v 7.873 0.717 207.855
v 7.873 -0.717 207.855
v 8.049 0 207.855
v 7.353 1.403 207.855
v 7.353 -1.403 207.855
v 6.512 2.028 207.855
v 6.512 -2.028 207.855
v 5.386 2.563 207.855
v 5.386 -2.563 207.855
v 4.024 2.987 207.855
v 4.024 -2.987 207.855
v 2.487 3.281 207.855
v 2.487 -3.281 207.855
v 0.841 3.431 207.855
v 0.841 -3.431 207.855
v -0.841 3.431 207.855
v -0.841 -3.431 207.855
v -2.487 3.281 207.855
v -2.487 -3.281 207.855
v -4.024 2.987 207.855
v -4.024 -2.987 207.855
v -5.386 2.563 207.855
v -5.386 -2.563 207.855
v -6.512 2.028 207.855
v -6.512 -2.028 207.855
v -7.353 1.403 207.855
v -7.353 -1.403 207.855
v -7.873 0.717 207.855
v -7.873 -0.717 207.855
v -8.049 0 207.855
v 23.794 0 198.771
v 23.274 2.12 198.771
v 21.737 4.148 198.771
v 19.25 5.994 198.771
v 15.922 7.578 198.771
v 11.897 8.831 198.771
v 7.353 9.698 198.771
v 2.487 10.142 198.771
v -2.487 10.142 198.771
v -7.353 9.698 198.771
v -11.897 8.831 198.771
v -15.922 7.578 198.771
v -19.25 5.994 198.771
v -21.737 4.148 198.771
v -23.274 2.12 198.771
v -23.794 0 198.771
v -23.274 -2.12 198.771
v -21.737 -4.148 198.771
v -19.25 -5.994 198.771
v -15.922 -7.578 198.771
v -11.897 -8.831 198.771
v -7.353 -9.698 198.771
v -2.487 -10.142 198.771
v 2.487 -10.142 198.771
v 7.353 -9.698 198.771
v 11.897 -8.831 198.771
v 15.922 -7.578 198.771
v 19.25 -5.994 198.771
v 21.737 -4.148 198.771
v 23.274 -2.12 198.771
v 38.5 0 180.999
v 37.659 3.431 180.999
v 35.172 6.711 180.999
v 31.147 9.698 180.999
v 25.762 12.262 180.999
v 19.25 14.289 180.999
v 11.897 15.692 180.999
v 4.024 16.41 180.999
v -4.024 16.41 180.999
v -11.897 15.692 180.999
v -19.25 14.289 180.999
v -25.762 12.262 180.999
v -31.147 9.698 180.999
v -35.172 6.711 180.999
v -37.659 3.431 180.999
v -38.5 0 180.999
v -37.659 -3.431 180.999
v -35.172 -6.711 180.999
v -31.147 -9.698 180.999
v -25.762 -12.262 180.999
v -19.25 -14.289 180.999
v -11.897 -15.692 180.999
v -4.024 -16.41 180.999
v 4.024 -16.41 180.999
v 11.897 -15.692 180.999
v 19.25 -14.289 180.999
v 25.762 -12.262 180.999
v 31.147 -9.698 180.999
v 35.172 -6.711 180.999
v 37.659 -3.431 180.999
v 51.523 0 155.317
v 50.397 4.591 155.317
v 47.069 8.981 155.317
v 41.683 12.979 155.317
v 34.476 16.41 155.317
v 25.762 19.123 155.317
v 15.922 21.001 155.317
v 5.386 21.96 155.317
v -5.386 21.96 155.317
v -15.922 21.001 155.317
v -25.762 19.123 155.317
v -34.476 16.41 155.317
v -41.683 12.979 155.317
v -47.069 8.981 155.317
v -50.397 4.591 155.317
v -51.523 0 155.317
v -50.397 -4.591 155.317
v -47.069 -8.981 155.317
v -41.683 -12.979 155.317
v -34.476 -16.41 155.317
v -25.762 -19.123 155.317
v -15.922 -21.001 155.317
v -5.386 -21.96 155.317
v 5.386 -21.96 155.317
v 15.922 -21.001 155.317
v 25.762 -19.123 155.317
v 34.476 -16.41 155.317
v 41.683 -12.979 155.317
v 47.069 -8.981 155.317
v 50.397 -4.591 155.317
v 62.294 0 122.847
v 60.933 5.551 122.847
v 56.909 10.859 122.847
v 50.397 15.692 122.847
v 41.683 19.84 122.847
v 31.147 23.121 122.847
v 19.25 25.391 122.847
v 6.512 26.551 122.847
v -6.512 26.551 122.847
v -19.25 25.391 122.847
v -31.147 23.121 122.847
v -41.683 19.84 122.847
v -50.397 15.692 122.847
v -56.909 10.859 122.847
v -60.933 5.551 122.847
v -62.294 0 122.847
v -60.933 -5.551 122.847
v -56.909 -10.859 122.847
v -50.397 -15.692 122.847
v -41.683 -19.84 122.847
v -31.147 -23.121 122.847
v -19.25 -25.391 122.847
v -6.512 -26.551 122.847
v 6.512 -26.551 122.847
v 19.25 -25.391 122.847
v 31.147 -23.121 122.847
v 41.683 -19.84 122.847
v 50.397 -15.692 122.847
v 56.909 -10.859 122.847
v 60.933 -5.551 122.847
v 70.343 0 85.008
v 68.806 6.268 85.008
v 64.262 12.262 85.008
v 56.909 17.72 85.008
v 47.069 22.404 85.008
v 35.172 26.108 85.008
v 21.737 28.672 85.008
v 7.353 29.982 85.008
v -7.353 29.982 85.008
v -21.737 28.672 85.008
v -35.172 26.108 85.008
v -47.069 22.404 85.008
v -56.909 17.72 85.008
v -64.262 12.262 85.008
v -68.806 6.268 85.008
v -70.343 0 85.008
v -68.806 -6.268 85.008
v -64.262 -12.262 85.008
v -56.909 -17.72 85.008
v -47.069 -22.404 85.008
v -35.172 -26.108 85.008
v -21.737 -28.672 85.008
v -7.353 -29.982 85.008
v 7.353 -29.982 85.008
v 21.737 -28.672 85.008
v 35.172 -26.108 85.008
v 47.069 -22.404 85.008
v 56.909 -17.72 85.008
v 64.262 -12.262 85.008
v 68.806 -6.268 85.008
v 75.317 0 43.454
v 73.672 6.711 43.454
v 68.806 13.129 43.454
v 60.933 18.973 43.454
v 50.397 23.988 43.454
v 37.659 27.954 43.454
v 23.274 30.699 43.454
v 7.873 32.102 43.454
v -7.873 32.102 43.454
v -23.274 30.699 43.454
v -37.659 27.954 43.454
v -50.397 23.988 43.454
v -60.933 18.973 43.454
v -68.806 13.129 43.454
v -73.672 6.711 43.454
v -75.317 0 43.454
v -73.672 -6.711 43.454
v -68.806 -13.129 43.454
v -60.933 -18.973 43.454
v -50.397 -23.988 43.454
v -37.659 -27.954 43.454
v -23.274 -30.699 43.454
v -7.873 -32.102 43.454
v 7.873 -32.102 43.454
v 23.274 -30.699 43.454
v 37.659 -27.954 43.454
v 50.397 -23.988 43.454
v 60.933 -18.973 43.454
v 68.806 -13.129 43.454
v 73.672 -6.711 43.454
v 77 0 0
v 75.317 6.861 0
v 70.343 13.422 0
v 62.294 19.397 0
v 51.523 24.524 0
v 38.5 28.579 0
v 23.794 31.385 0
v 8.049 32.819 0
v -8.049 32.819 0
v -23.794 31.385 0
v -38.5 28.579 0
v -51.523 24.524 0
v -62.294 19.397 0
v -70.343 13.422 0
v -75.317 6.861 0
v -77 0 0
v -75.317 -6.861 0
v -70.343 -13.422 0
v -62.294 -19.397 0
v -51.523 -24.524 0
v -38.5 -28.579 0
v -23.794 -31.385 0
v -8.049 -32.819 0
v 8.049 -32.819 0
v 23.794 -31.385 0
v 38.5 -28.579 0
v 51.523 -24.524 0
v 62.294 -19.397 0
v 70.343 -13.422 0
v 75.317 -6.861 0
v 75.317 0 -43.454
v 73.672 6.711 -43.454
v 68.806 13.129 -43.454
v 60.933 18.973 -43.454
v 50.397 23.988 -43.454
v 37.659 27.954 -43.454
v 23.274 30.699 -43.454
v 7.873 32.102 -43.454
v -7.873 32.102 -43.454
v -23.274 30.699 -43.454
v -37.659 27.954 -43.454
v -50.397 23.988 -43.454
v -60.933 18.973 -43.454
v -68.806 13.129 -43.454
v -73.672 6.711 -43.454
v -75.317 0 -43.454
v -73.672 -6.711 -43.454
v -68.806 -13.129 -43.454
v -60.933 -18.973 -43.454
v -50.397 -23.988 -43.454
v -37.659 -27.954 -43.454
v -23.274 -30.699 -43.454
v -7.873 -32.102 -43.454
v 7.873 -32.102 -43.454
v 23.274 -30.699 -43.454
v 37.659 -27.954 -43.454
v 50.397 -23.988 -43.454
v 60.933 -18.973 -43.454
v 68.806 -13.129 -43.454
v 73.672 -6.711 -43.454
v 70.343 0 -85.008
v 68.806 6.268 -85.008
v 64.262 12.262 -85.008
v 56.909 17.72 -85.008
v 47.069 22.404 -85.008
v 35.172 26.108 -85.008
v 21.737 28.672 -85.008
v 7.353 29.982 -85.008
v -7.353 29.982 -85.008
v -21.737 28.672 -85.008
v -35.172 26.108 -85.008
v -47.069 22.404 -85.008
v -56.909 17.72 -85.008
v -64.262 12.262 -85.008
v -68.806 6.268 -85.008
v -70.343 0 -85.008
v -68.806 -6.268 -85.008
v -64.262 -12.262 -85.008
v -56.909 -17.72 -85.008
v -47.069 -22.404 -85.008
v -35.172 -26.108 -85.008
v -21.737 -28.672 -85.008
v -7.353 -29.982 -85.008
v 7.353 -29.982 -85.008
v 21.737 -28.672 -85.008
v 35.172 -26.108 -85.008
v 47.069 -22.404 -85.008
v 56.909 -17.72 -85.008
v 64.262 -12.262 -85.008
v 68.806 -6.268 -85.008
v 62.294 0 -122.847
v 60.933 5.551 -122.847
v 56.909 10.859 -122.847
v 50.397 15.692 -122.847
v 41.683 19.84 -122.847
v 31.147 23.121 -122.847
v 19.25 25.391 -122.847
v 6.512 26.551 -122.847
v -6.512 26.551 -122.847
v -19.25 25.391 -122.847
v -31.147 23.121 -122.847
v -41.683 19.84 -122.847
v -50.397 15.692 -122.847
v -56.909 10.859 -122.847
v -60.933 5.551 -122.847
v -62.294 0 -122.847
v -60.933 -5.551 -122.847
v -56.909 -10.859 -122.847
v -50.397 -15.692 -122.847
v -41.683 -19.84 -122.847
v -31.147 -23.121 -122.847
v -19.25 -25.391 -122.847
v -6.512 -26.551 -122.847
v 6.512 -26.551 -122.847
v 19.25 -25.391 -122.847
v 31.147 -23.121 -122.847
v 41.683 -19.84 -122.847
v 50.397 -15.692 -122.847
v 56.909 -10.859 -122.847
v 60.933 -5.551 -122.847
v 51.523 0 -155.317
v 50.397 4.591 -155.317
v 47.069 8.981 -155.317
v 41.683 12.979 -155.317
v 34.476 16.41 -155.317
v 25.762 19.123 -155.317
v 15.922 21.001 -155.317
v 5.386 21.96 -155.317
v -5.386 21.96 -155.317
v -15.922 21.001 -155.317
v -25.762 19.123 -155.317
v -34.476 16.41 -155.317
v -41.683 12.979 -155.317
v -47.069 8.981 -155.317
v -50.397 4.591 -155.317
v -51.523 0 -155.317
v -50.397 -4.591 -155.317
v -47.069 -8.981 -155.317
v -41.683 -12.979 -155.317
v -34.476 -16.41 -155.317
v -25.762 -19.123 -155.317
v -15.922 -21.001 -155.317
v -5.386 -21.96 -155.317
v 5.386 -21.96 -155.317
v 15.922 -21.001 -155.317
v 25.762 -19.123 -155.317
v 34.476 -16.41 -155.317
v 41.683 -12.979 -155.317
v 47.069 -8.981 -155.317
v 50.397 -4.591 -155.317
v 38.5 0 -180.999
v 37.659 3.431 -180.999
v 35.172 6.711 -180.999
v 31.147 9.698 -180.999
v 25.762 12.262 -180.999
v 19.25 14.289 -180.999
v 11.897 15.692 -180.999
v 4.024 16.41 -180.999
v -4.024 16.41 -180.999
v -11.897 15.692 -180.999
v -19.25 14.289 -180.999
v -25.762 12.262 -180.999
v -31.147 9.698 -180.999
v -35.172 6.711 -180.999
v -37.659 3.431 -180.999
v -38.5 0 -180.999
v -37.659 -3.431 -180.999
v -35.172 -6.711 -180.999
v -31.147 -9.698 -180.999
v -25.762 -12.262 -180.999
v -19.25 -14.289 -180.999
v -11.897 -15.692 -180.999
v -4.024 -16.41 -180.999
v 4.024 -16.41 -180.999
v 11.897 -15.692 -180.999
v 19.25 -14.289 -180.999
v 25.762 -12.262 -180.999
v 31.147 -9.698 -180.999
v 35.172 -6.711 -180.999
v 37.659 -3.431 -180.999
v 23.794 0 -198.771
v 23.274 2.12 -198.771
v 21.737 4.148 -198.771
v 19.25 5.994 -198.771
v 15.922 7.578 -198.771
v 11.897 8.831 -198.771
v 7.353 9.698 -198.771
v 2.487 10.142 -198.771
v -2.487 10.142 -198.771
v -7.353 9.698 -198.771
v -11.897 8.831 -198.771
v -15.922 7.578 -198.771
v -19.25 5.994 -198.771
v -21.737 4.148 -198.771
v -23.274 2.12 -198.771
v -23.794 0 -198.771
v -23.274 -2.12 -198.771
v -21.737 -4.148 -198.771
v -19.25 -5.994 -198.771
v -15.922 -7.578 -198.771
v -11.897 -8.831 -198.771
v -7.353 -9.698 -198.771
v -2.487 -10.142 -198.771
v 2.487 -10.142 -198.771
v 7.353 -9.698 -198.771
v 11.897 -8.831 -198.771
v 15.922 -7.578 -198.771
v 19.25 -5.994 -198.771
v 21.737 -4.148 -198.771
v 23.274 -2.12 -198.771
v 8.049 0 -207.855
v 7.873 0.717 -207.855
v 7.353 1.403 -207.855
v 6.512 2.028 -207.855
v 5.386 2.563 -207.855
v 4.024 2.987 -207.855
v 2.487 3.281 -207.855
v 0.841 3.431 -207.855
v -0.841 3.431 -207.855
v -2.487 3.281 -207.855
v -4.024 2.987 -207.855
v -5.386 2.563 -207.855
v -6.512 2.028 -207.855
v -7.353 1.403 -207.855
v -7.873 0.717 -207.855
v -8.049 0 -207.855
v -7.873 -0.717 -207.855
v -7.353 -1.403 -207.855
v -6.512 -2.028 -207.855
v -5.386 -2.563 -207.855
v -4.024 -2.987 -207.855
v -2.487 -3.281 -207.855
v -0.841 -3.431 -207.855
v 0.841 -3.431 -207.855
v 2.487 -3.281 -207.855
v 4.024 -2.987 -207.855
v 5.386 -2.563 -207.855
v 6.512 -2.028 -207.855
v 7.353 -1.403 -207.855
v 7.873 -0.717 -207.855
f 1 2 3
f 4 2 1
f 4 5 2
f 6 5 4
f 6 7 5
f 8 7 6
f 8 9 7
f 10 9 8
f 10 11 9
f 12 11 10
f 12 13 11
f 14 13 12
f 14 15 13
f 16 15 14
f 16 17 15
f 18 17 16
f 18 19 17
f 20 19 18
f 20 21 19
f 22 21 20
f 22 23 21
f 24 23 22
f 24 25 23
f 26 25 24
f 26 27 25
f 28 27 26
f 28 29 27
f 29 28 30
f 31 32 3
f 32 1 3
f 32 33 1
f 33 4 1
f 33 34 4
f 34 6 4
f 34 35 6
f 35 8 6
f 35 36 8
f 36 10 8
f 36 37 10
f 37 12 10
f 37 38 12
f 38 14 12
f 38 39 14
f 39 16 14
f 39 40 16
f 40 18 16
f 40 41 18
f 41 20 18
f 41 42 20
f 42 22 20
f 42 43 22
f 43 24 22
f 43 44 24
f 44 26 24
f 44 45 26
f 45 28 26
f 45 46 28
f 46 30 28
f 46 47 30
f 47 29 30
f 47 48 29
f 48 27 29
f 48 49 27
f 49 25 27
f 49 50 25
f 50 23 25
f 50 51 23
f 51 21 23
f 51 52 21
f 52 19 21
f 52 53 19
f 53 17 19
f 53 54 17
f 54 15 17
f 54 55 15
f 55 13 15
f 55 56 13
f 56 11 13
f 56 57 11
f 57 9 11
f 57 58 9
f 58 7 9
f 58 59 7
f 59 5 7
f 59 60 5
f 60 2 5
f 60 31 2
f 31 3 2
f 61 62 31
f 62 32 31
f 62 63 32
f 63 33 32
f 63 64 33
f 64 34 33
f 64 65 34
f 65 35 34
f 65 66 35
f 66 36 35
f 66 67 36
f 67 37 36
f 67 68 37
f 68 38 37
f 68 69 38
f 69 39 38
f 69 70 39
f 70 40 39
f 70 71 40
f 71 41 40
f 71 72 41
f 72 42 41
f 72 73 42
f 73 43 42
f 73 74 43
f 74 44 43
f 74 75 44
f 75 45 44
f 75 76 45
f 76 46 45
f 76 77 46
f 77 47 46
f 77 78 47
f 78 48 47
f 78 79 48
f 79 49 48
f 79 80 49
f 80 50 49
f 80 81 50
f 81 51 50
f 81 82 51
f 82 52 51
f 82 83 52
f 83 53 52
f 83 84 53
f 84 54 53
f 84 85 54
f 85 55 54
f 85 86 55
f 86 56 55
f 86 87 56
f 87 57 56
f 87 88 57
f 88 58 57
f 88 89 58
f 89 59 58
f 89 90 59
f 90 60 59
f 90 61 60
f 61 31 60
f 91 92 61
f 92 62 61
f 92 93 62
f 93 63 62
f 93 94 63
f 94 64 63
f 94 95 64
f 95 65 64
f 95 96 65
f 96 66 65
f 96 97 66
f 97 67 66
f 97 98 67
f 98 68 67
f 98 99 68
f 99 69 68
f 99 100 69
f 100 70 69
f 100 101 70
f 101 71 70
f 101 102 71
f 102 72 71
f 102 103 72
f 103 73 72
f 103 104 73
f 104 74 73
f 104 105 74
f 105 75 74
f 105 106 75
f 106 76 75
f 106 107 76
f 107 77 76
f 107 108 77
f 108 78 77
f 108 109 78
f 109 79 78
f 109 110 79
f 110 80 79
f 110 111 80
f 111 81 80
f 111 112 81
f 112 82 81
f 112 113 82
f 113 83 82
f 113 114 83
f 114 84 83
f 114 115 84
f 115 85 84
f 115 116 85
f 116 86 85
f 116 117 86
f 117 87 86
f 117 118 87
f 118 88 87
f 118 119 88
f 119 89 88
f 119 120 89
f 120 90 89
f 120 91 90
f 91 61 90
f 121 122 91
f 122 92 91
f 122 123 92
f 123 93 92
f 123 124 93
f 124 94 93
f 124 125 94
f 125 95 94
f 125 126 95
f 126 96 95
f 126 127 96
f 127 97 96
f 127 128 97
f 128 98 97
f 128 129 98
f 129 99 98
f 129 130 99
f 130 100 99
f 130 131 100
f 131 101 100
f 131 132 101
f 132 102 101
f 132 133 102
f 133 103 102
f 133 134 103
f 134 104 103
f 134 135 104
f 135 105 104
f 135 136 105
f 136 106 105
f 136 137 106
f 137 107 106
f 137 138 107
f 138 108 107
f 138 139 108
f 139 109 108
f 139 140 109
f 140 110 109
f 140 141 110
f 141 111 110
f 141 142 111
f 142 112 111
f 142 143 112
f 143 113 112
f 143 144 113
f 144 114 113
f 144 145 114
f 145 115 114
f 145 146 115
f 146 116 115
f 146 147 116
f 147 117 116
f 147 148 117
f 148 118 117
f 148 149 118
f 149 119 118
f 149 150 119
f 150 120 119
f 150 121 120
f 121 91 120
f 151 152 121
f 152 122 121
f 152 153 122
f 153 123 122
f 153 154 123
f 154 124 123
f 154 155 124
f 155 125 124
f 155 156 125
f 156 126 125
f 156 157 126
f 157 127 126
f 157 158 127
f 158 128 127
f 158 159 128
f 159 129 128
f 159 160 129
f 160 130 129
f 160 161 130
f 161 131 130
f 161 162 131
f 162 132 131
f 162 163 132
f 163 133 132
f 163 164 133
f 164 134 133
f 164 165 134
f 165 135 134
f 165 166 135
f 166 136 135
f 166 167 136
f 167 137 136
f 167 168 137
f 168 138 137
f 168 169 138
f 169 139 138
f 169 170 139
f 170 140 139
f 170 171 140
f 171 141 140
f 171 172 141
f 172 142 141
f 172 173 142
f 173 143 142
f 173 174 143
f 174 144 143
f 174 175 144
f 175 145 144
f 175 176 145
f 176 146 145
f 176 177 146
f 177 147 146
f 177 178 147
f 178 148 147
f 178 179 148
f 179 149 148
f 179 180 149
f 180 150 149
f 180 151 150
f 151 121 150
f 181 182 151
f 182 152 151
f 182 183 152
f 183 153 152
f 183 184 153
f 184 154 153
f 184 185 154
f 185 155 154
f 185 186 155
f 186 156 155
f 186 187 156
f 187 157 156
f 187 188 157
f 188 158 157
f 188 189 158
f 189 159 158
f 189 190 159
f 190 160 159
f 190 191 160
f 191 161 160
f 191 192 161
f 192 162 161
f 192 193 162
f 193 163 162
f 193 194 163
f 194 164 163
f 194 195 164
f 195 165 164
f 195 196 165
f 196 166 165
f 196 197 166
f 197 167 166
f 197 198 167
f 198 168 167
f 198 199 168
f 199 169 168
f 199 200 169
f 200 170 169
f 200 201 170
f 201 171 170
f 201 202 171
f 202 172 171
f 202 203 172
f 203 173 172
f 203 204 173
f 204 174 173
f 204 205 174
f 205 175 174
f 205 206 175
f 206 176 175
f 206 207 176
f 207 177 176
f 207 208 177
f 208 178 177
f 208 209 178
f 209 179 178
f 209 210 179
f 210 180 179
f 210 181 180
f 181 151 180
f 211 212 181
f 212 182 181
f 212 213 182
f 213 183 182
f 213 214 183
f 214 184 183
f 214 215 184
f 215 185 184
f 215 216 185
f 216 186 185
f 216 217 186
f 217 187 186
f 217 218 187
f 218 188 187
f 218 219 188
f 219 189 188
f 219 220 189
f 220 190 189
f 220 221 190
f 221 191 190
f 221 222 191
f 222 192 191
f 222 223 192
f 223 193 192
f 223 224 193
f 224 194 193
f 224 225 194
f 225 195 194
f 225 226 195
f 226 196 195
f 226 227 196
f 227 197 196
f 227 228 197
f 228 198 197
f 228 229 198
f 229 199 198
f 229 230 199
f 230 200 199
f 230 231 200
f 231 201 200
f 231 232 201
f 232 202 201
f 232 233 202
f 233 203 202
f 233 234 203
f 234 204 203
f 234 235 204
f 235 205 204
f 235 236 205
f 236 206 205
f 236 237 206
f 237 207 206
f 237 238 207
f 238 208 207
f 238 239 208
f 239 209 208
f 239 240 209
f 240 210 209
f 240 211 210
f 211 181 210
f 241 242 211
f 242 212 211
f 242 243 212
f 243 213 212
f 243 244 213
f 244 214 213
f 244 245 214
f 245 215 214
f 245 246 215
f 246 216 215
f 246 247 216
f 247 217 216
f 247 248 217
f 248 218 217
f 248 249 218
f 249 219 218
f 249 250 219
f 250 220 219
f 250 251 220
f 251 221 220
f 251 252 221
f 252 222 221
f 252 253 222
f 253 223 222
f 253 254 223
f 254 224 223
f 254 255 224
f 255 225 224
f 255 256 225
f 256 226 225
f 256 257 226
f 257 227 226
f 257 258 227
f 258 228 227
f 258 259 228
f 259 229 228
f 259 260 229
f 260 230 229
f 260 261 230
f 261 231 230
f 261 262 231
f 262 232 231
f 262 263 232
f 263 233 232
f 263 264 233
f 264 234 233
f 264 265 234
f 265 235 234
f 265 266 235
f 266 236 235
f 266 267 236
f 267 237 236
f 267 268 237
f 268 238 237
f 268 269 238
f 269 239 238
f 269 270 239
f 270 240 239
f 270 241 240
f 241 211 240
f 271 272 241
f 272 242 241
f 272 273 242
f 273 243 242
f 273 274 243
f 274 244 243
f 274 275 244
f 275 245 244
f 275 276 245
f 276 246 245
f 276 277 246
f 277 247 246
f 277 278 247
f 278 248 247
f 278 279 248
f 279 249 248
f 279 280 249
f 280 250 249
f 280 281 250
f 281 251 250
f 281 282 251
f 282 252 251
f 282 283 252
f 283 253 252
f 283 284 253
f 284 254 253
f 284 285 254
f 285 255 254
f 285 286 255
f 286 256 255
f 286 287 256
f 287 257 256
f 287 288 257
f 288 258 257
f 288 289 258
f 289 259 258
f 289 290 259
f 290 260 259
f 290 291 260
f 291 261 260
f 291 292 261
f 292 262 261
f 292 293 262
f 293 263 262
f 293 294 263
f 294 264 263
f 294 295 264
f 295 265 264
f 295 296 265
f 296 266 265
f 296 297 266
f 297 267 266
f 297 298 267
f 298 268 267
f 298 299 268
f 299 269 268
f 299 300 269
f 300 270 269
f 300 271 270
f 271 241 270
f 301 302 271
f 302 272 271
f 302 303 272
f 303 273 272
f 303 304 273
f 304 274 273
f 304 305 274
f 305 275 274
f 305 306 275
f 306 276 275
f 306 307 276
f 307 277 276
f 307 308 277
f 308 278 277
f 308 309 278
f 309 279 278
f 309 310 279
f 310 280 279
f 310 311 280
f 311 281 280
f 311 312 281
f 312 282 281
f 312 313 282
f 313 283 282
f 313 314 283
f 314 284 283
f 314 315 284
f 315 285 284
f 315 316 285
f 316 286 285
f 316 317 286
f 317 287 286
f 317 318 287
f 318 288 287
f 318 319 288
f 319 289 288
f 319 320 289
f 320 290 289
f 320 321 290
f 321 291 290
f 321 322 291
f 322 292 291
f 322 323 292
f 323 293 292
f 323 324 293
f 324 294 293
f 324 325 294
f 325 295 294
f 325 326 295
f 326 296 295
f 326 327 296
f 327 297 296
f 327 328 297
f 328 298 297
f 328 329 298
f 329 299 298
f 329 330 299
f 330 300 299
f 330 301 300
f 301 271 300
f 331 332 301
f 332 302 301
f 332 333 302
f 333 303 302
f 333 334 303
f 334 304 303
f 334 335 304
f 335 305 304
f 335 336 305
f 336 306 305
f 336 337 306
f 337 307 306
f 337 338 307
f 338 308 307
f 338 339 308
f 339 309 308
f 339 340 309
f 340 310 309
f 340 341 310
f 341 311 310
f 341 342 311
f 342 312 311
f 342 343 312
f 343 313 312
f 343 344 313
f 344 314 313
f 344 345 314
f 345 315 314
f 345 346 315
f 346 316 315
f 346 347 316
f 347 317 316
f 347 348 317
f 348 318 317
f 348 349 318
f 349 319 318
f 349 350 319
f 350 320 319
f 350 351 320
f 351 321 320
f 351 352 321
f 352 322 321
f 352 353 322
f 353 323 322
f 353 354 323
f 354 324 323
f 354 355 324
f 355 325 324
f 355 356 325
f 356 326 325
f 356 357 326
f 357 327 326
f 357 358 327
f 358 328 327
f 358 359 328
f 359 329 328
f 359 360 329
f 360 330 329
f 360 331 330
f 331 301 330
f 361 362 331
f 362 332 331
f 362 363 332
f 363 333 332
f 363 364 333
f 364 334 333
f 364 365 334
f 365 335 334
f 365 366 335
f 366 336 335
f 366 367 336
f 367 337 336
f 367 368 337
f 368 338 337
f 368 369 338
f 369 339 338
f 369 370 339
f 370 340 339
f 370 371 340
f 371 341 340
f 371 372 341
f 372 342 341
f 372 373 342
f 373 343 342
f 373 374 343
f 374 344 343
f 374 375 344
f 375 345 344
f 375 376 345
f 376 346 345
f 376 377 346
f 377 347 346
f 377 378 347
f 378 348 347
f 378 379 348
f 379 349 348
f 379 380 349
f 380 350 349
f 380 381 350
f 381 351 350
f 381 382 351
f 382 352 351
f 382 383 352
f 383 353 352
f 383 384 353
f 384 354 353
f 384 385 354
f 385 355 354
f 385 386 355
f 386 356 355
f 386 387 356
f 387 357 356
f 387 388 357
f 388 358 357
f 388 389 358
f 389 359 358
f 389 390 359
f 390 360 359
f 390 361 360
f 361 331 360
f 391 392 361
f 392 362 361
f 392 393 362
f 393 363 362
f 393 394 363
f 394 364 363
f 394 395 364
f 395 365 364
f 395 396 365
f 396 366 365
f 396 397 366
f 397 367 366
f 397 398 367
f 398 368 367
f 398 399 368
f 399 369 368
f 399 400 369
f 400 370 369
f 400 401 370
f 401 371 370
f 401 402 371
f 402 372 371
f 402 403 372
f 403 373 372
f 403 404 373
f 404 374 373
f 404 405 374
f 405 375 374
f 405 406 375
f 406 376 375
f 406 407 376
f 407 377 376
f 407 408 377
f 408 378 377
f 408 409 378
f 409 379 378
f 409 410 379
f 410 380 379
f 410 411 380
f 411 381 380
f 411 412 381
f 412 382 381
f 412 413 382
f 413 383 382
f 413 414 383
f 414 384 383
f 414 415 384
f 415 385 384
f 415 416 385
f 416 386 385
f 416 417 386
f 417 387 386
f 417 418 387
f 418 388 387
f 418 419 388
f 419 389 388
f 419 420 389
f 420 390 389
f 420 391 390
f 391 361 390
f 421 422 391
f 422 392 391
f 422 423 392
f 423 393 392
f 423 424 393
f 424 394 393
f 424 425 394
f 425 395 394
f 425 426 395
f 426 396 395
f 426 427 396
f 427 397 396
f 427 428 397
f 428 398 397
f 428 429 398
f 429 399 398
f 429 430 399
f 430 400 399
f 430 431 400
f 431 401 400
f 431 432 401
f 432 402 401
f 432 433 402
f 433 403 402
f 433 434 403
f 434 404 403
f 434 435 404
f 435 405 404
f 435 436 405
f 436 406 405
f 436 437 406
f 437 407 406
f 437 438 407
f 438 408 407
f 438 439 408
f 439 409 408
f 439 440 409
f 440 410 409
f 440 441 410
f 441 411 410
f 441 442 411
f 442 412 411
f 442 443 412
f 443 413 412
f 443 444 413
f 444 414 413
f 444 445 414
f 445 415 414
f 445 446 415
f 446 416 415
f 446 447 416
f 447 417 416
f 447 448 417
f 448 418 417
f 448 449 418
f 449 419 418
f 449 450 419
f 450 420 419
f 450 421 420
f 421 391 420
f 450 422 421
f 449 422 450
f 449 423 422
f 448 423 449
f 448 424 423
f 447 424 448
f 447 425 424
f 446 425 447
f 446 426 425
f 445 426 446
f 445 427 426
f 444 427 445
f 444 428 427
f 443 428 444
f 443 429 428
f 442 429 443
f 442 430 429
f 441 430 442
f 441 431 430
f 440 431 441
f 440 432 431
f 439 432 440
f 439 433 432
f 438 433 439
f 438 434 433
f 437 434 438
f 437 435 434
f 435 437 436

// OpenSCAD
// Generated by SolidPython 1.0.1 on 2020-07-29 00:46:47


scale(v = [7, 3, 19]) {
	sphere(r = 11);
}
/***********************************************
*********      SolidPython code:      **********
************************************************
 
# import packages: SolidPython
from solid import *
from solid.utils import *
from itertools import chain, combinations, permutations


class Resize:

    def __init__(self, scad_file):
        self.scad_file = scad_file
        #self.scad_file = import_scad(scad_file)
        # cone/cylinder param:
        self.r1 = 0
        self.r2 = 0
        self.h = 0
        # rectangular prism param:
        self.w = 0
        self.l = 0
        # ellipse param:
        self.r = 0

    # import OpenScad code (file name corresponds to shape)


    # classify shape + parameters
    def assign(self, param1, param2, param3):
        if self.scad_file == 'cone.scad':
            self.r1 = param1
            self.r2 = param2
            self.h = param3
        elif self.scad_file == 'cylinder.scad':
            self.r1 = param1
            self.r2 = param2
            self.h = param3
        elif self.scad_file == 'rectangularPrism.scad':
            self.h = param1
            self.l = param2
            self.w = param3
        else:
            self.r = param1
            self.h = param2

    # resize parameters
    def iterate(self):
        x = range(3, 20, 2)
        i = 1
        if self.scad_file == 'cone.scad':
            tempList = list(permutations(x, 2))
            for temp in tempList:
                param1 = temp[0]
                param2 = temp[1]
                filepath = 'produced_scad_files/' + 'cone' + str(param1) + '_' + str(param2) + '_' + '.scad'
                scad_render_to_file(cylinder(h=param1, r1=param2, r2=0), filepath)

        elif self.scad_file == 'cylinder.scad':
            tempList = list(permutations(x, 3))
            for temp in tempList:
                param1 = temp[0]
                param2 = temp[1]
                filepath = 'produced_scad_files/' + 'cylinder' + str(param1) + '_' + str(param2) + '_' + '.scad'
                scad_render_to_file(cylinder(h=param1, r1=param2, r2=param2), filepath)

        elif self.scad_file == 'rectangularPrism.scad':
            tempList = list(permutations(x, 3))
            for temp in tempList:
                param1 = temp[0]
                param2 = temp[1]
                param3 = temp[2]
                filepath = 'produced_scad_files/' + 'rectangularPrism' + str(param1) + '_' + str(param2) + '_' + str(
                    param3) + '.scad'
                scad_render_to_file(cube(size=(param1, param2, param3)), filepath)

        elif self.scad_file == 'ellipse.scad':
            tempList = list(permutations(x, 4))
            for temp in tempList:
                param1 = temp[0]
                param2 = temp[1]
                param3 = temp[2]
                param4 = temp[3]
                filepath = 'produced_scad_files/' + 'ellipse' + str(param1) + '_' + str(param2) + '_' + str(param3) + '_' + str(param4) + '.scad'
                scad_render_to_file(scale([param1, param2, param3])(sphere(r=param4)), filepath)

    def render_to_scadfile(self):
        scad_render_to_file(scad, 'example.scad') 
 
************************************************/
